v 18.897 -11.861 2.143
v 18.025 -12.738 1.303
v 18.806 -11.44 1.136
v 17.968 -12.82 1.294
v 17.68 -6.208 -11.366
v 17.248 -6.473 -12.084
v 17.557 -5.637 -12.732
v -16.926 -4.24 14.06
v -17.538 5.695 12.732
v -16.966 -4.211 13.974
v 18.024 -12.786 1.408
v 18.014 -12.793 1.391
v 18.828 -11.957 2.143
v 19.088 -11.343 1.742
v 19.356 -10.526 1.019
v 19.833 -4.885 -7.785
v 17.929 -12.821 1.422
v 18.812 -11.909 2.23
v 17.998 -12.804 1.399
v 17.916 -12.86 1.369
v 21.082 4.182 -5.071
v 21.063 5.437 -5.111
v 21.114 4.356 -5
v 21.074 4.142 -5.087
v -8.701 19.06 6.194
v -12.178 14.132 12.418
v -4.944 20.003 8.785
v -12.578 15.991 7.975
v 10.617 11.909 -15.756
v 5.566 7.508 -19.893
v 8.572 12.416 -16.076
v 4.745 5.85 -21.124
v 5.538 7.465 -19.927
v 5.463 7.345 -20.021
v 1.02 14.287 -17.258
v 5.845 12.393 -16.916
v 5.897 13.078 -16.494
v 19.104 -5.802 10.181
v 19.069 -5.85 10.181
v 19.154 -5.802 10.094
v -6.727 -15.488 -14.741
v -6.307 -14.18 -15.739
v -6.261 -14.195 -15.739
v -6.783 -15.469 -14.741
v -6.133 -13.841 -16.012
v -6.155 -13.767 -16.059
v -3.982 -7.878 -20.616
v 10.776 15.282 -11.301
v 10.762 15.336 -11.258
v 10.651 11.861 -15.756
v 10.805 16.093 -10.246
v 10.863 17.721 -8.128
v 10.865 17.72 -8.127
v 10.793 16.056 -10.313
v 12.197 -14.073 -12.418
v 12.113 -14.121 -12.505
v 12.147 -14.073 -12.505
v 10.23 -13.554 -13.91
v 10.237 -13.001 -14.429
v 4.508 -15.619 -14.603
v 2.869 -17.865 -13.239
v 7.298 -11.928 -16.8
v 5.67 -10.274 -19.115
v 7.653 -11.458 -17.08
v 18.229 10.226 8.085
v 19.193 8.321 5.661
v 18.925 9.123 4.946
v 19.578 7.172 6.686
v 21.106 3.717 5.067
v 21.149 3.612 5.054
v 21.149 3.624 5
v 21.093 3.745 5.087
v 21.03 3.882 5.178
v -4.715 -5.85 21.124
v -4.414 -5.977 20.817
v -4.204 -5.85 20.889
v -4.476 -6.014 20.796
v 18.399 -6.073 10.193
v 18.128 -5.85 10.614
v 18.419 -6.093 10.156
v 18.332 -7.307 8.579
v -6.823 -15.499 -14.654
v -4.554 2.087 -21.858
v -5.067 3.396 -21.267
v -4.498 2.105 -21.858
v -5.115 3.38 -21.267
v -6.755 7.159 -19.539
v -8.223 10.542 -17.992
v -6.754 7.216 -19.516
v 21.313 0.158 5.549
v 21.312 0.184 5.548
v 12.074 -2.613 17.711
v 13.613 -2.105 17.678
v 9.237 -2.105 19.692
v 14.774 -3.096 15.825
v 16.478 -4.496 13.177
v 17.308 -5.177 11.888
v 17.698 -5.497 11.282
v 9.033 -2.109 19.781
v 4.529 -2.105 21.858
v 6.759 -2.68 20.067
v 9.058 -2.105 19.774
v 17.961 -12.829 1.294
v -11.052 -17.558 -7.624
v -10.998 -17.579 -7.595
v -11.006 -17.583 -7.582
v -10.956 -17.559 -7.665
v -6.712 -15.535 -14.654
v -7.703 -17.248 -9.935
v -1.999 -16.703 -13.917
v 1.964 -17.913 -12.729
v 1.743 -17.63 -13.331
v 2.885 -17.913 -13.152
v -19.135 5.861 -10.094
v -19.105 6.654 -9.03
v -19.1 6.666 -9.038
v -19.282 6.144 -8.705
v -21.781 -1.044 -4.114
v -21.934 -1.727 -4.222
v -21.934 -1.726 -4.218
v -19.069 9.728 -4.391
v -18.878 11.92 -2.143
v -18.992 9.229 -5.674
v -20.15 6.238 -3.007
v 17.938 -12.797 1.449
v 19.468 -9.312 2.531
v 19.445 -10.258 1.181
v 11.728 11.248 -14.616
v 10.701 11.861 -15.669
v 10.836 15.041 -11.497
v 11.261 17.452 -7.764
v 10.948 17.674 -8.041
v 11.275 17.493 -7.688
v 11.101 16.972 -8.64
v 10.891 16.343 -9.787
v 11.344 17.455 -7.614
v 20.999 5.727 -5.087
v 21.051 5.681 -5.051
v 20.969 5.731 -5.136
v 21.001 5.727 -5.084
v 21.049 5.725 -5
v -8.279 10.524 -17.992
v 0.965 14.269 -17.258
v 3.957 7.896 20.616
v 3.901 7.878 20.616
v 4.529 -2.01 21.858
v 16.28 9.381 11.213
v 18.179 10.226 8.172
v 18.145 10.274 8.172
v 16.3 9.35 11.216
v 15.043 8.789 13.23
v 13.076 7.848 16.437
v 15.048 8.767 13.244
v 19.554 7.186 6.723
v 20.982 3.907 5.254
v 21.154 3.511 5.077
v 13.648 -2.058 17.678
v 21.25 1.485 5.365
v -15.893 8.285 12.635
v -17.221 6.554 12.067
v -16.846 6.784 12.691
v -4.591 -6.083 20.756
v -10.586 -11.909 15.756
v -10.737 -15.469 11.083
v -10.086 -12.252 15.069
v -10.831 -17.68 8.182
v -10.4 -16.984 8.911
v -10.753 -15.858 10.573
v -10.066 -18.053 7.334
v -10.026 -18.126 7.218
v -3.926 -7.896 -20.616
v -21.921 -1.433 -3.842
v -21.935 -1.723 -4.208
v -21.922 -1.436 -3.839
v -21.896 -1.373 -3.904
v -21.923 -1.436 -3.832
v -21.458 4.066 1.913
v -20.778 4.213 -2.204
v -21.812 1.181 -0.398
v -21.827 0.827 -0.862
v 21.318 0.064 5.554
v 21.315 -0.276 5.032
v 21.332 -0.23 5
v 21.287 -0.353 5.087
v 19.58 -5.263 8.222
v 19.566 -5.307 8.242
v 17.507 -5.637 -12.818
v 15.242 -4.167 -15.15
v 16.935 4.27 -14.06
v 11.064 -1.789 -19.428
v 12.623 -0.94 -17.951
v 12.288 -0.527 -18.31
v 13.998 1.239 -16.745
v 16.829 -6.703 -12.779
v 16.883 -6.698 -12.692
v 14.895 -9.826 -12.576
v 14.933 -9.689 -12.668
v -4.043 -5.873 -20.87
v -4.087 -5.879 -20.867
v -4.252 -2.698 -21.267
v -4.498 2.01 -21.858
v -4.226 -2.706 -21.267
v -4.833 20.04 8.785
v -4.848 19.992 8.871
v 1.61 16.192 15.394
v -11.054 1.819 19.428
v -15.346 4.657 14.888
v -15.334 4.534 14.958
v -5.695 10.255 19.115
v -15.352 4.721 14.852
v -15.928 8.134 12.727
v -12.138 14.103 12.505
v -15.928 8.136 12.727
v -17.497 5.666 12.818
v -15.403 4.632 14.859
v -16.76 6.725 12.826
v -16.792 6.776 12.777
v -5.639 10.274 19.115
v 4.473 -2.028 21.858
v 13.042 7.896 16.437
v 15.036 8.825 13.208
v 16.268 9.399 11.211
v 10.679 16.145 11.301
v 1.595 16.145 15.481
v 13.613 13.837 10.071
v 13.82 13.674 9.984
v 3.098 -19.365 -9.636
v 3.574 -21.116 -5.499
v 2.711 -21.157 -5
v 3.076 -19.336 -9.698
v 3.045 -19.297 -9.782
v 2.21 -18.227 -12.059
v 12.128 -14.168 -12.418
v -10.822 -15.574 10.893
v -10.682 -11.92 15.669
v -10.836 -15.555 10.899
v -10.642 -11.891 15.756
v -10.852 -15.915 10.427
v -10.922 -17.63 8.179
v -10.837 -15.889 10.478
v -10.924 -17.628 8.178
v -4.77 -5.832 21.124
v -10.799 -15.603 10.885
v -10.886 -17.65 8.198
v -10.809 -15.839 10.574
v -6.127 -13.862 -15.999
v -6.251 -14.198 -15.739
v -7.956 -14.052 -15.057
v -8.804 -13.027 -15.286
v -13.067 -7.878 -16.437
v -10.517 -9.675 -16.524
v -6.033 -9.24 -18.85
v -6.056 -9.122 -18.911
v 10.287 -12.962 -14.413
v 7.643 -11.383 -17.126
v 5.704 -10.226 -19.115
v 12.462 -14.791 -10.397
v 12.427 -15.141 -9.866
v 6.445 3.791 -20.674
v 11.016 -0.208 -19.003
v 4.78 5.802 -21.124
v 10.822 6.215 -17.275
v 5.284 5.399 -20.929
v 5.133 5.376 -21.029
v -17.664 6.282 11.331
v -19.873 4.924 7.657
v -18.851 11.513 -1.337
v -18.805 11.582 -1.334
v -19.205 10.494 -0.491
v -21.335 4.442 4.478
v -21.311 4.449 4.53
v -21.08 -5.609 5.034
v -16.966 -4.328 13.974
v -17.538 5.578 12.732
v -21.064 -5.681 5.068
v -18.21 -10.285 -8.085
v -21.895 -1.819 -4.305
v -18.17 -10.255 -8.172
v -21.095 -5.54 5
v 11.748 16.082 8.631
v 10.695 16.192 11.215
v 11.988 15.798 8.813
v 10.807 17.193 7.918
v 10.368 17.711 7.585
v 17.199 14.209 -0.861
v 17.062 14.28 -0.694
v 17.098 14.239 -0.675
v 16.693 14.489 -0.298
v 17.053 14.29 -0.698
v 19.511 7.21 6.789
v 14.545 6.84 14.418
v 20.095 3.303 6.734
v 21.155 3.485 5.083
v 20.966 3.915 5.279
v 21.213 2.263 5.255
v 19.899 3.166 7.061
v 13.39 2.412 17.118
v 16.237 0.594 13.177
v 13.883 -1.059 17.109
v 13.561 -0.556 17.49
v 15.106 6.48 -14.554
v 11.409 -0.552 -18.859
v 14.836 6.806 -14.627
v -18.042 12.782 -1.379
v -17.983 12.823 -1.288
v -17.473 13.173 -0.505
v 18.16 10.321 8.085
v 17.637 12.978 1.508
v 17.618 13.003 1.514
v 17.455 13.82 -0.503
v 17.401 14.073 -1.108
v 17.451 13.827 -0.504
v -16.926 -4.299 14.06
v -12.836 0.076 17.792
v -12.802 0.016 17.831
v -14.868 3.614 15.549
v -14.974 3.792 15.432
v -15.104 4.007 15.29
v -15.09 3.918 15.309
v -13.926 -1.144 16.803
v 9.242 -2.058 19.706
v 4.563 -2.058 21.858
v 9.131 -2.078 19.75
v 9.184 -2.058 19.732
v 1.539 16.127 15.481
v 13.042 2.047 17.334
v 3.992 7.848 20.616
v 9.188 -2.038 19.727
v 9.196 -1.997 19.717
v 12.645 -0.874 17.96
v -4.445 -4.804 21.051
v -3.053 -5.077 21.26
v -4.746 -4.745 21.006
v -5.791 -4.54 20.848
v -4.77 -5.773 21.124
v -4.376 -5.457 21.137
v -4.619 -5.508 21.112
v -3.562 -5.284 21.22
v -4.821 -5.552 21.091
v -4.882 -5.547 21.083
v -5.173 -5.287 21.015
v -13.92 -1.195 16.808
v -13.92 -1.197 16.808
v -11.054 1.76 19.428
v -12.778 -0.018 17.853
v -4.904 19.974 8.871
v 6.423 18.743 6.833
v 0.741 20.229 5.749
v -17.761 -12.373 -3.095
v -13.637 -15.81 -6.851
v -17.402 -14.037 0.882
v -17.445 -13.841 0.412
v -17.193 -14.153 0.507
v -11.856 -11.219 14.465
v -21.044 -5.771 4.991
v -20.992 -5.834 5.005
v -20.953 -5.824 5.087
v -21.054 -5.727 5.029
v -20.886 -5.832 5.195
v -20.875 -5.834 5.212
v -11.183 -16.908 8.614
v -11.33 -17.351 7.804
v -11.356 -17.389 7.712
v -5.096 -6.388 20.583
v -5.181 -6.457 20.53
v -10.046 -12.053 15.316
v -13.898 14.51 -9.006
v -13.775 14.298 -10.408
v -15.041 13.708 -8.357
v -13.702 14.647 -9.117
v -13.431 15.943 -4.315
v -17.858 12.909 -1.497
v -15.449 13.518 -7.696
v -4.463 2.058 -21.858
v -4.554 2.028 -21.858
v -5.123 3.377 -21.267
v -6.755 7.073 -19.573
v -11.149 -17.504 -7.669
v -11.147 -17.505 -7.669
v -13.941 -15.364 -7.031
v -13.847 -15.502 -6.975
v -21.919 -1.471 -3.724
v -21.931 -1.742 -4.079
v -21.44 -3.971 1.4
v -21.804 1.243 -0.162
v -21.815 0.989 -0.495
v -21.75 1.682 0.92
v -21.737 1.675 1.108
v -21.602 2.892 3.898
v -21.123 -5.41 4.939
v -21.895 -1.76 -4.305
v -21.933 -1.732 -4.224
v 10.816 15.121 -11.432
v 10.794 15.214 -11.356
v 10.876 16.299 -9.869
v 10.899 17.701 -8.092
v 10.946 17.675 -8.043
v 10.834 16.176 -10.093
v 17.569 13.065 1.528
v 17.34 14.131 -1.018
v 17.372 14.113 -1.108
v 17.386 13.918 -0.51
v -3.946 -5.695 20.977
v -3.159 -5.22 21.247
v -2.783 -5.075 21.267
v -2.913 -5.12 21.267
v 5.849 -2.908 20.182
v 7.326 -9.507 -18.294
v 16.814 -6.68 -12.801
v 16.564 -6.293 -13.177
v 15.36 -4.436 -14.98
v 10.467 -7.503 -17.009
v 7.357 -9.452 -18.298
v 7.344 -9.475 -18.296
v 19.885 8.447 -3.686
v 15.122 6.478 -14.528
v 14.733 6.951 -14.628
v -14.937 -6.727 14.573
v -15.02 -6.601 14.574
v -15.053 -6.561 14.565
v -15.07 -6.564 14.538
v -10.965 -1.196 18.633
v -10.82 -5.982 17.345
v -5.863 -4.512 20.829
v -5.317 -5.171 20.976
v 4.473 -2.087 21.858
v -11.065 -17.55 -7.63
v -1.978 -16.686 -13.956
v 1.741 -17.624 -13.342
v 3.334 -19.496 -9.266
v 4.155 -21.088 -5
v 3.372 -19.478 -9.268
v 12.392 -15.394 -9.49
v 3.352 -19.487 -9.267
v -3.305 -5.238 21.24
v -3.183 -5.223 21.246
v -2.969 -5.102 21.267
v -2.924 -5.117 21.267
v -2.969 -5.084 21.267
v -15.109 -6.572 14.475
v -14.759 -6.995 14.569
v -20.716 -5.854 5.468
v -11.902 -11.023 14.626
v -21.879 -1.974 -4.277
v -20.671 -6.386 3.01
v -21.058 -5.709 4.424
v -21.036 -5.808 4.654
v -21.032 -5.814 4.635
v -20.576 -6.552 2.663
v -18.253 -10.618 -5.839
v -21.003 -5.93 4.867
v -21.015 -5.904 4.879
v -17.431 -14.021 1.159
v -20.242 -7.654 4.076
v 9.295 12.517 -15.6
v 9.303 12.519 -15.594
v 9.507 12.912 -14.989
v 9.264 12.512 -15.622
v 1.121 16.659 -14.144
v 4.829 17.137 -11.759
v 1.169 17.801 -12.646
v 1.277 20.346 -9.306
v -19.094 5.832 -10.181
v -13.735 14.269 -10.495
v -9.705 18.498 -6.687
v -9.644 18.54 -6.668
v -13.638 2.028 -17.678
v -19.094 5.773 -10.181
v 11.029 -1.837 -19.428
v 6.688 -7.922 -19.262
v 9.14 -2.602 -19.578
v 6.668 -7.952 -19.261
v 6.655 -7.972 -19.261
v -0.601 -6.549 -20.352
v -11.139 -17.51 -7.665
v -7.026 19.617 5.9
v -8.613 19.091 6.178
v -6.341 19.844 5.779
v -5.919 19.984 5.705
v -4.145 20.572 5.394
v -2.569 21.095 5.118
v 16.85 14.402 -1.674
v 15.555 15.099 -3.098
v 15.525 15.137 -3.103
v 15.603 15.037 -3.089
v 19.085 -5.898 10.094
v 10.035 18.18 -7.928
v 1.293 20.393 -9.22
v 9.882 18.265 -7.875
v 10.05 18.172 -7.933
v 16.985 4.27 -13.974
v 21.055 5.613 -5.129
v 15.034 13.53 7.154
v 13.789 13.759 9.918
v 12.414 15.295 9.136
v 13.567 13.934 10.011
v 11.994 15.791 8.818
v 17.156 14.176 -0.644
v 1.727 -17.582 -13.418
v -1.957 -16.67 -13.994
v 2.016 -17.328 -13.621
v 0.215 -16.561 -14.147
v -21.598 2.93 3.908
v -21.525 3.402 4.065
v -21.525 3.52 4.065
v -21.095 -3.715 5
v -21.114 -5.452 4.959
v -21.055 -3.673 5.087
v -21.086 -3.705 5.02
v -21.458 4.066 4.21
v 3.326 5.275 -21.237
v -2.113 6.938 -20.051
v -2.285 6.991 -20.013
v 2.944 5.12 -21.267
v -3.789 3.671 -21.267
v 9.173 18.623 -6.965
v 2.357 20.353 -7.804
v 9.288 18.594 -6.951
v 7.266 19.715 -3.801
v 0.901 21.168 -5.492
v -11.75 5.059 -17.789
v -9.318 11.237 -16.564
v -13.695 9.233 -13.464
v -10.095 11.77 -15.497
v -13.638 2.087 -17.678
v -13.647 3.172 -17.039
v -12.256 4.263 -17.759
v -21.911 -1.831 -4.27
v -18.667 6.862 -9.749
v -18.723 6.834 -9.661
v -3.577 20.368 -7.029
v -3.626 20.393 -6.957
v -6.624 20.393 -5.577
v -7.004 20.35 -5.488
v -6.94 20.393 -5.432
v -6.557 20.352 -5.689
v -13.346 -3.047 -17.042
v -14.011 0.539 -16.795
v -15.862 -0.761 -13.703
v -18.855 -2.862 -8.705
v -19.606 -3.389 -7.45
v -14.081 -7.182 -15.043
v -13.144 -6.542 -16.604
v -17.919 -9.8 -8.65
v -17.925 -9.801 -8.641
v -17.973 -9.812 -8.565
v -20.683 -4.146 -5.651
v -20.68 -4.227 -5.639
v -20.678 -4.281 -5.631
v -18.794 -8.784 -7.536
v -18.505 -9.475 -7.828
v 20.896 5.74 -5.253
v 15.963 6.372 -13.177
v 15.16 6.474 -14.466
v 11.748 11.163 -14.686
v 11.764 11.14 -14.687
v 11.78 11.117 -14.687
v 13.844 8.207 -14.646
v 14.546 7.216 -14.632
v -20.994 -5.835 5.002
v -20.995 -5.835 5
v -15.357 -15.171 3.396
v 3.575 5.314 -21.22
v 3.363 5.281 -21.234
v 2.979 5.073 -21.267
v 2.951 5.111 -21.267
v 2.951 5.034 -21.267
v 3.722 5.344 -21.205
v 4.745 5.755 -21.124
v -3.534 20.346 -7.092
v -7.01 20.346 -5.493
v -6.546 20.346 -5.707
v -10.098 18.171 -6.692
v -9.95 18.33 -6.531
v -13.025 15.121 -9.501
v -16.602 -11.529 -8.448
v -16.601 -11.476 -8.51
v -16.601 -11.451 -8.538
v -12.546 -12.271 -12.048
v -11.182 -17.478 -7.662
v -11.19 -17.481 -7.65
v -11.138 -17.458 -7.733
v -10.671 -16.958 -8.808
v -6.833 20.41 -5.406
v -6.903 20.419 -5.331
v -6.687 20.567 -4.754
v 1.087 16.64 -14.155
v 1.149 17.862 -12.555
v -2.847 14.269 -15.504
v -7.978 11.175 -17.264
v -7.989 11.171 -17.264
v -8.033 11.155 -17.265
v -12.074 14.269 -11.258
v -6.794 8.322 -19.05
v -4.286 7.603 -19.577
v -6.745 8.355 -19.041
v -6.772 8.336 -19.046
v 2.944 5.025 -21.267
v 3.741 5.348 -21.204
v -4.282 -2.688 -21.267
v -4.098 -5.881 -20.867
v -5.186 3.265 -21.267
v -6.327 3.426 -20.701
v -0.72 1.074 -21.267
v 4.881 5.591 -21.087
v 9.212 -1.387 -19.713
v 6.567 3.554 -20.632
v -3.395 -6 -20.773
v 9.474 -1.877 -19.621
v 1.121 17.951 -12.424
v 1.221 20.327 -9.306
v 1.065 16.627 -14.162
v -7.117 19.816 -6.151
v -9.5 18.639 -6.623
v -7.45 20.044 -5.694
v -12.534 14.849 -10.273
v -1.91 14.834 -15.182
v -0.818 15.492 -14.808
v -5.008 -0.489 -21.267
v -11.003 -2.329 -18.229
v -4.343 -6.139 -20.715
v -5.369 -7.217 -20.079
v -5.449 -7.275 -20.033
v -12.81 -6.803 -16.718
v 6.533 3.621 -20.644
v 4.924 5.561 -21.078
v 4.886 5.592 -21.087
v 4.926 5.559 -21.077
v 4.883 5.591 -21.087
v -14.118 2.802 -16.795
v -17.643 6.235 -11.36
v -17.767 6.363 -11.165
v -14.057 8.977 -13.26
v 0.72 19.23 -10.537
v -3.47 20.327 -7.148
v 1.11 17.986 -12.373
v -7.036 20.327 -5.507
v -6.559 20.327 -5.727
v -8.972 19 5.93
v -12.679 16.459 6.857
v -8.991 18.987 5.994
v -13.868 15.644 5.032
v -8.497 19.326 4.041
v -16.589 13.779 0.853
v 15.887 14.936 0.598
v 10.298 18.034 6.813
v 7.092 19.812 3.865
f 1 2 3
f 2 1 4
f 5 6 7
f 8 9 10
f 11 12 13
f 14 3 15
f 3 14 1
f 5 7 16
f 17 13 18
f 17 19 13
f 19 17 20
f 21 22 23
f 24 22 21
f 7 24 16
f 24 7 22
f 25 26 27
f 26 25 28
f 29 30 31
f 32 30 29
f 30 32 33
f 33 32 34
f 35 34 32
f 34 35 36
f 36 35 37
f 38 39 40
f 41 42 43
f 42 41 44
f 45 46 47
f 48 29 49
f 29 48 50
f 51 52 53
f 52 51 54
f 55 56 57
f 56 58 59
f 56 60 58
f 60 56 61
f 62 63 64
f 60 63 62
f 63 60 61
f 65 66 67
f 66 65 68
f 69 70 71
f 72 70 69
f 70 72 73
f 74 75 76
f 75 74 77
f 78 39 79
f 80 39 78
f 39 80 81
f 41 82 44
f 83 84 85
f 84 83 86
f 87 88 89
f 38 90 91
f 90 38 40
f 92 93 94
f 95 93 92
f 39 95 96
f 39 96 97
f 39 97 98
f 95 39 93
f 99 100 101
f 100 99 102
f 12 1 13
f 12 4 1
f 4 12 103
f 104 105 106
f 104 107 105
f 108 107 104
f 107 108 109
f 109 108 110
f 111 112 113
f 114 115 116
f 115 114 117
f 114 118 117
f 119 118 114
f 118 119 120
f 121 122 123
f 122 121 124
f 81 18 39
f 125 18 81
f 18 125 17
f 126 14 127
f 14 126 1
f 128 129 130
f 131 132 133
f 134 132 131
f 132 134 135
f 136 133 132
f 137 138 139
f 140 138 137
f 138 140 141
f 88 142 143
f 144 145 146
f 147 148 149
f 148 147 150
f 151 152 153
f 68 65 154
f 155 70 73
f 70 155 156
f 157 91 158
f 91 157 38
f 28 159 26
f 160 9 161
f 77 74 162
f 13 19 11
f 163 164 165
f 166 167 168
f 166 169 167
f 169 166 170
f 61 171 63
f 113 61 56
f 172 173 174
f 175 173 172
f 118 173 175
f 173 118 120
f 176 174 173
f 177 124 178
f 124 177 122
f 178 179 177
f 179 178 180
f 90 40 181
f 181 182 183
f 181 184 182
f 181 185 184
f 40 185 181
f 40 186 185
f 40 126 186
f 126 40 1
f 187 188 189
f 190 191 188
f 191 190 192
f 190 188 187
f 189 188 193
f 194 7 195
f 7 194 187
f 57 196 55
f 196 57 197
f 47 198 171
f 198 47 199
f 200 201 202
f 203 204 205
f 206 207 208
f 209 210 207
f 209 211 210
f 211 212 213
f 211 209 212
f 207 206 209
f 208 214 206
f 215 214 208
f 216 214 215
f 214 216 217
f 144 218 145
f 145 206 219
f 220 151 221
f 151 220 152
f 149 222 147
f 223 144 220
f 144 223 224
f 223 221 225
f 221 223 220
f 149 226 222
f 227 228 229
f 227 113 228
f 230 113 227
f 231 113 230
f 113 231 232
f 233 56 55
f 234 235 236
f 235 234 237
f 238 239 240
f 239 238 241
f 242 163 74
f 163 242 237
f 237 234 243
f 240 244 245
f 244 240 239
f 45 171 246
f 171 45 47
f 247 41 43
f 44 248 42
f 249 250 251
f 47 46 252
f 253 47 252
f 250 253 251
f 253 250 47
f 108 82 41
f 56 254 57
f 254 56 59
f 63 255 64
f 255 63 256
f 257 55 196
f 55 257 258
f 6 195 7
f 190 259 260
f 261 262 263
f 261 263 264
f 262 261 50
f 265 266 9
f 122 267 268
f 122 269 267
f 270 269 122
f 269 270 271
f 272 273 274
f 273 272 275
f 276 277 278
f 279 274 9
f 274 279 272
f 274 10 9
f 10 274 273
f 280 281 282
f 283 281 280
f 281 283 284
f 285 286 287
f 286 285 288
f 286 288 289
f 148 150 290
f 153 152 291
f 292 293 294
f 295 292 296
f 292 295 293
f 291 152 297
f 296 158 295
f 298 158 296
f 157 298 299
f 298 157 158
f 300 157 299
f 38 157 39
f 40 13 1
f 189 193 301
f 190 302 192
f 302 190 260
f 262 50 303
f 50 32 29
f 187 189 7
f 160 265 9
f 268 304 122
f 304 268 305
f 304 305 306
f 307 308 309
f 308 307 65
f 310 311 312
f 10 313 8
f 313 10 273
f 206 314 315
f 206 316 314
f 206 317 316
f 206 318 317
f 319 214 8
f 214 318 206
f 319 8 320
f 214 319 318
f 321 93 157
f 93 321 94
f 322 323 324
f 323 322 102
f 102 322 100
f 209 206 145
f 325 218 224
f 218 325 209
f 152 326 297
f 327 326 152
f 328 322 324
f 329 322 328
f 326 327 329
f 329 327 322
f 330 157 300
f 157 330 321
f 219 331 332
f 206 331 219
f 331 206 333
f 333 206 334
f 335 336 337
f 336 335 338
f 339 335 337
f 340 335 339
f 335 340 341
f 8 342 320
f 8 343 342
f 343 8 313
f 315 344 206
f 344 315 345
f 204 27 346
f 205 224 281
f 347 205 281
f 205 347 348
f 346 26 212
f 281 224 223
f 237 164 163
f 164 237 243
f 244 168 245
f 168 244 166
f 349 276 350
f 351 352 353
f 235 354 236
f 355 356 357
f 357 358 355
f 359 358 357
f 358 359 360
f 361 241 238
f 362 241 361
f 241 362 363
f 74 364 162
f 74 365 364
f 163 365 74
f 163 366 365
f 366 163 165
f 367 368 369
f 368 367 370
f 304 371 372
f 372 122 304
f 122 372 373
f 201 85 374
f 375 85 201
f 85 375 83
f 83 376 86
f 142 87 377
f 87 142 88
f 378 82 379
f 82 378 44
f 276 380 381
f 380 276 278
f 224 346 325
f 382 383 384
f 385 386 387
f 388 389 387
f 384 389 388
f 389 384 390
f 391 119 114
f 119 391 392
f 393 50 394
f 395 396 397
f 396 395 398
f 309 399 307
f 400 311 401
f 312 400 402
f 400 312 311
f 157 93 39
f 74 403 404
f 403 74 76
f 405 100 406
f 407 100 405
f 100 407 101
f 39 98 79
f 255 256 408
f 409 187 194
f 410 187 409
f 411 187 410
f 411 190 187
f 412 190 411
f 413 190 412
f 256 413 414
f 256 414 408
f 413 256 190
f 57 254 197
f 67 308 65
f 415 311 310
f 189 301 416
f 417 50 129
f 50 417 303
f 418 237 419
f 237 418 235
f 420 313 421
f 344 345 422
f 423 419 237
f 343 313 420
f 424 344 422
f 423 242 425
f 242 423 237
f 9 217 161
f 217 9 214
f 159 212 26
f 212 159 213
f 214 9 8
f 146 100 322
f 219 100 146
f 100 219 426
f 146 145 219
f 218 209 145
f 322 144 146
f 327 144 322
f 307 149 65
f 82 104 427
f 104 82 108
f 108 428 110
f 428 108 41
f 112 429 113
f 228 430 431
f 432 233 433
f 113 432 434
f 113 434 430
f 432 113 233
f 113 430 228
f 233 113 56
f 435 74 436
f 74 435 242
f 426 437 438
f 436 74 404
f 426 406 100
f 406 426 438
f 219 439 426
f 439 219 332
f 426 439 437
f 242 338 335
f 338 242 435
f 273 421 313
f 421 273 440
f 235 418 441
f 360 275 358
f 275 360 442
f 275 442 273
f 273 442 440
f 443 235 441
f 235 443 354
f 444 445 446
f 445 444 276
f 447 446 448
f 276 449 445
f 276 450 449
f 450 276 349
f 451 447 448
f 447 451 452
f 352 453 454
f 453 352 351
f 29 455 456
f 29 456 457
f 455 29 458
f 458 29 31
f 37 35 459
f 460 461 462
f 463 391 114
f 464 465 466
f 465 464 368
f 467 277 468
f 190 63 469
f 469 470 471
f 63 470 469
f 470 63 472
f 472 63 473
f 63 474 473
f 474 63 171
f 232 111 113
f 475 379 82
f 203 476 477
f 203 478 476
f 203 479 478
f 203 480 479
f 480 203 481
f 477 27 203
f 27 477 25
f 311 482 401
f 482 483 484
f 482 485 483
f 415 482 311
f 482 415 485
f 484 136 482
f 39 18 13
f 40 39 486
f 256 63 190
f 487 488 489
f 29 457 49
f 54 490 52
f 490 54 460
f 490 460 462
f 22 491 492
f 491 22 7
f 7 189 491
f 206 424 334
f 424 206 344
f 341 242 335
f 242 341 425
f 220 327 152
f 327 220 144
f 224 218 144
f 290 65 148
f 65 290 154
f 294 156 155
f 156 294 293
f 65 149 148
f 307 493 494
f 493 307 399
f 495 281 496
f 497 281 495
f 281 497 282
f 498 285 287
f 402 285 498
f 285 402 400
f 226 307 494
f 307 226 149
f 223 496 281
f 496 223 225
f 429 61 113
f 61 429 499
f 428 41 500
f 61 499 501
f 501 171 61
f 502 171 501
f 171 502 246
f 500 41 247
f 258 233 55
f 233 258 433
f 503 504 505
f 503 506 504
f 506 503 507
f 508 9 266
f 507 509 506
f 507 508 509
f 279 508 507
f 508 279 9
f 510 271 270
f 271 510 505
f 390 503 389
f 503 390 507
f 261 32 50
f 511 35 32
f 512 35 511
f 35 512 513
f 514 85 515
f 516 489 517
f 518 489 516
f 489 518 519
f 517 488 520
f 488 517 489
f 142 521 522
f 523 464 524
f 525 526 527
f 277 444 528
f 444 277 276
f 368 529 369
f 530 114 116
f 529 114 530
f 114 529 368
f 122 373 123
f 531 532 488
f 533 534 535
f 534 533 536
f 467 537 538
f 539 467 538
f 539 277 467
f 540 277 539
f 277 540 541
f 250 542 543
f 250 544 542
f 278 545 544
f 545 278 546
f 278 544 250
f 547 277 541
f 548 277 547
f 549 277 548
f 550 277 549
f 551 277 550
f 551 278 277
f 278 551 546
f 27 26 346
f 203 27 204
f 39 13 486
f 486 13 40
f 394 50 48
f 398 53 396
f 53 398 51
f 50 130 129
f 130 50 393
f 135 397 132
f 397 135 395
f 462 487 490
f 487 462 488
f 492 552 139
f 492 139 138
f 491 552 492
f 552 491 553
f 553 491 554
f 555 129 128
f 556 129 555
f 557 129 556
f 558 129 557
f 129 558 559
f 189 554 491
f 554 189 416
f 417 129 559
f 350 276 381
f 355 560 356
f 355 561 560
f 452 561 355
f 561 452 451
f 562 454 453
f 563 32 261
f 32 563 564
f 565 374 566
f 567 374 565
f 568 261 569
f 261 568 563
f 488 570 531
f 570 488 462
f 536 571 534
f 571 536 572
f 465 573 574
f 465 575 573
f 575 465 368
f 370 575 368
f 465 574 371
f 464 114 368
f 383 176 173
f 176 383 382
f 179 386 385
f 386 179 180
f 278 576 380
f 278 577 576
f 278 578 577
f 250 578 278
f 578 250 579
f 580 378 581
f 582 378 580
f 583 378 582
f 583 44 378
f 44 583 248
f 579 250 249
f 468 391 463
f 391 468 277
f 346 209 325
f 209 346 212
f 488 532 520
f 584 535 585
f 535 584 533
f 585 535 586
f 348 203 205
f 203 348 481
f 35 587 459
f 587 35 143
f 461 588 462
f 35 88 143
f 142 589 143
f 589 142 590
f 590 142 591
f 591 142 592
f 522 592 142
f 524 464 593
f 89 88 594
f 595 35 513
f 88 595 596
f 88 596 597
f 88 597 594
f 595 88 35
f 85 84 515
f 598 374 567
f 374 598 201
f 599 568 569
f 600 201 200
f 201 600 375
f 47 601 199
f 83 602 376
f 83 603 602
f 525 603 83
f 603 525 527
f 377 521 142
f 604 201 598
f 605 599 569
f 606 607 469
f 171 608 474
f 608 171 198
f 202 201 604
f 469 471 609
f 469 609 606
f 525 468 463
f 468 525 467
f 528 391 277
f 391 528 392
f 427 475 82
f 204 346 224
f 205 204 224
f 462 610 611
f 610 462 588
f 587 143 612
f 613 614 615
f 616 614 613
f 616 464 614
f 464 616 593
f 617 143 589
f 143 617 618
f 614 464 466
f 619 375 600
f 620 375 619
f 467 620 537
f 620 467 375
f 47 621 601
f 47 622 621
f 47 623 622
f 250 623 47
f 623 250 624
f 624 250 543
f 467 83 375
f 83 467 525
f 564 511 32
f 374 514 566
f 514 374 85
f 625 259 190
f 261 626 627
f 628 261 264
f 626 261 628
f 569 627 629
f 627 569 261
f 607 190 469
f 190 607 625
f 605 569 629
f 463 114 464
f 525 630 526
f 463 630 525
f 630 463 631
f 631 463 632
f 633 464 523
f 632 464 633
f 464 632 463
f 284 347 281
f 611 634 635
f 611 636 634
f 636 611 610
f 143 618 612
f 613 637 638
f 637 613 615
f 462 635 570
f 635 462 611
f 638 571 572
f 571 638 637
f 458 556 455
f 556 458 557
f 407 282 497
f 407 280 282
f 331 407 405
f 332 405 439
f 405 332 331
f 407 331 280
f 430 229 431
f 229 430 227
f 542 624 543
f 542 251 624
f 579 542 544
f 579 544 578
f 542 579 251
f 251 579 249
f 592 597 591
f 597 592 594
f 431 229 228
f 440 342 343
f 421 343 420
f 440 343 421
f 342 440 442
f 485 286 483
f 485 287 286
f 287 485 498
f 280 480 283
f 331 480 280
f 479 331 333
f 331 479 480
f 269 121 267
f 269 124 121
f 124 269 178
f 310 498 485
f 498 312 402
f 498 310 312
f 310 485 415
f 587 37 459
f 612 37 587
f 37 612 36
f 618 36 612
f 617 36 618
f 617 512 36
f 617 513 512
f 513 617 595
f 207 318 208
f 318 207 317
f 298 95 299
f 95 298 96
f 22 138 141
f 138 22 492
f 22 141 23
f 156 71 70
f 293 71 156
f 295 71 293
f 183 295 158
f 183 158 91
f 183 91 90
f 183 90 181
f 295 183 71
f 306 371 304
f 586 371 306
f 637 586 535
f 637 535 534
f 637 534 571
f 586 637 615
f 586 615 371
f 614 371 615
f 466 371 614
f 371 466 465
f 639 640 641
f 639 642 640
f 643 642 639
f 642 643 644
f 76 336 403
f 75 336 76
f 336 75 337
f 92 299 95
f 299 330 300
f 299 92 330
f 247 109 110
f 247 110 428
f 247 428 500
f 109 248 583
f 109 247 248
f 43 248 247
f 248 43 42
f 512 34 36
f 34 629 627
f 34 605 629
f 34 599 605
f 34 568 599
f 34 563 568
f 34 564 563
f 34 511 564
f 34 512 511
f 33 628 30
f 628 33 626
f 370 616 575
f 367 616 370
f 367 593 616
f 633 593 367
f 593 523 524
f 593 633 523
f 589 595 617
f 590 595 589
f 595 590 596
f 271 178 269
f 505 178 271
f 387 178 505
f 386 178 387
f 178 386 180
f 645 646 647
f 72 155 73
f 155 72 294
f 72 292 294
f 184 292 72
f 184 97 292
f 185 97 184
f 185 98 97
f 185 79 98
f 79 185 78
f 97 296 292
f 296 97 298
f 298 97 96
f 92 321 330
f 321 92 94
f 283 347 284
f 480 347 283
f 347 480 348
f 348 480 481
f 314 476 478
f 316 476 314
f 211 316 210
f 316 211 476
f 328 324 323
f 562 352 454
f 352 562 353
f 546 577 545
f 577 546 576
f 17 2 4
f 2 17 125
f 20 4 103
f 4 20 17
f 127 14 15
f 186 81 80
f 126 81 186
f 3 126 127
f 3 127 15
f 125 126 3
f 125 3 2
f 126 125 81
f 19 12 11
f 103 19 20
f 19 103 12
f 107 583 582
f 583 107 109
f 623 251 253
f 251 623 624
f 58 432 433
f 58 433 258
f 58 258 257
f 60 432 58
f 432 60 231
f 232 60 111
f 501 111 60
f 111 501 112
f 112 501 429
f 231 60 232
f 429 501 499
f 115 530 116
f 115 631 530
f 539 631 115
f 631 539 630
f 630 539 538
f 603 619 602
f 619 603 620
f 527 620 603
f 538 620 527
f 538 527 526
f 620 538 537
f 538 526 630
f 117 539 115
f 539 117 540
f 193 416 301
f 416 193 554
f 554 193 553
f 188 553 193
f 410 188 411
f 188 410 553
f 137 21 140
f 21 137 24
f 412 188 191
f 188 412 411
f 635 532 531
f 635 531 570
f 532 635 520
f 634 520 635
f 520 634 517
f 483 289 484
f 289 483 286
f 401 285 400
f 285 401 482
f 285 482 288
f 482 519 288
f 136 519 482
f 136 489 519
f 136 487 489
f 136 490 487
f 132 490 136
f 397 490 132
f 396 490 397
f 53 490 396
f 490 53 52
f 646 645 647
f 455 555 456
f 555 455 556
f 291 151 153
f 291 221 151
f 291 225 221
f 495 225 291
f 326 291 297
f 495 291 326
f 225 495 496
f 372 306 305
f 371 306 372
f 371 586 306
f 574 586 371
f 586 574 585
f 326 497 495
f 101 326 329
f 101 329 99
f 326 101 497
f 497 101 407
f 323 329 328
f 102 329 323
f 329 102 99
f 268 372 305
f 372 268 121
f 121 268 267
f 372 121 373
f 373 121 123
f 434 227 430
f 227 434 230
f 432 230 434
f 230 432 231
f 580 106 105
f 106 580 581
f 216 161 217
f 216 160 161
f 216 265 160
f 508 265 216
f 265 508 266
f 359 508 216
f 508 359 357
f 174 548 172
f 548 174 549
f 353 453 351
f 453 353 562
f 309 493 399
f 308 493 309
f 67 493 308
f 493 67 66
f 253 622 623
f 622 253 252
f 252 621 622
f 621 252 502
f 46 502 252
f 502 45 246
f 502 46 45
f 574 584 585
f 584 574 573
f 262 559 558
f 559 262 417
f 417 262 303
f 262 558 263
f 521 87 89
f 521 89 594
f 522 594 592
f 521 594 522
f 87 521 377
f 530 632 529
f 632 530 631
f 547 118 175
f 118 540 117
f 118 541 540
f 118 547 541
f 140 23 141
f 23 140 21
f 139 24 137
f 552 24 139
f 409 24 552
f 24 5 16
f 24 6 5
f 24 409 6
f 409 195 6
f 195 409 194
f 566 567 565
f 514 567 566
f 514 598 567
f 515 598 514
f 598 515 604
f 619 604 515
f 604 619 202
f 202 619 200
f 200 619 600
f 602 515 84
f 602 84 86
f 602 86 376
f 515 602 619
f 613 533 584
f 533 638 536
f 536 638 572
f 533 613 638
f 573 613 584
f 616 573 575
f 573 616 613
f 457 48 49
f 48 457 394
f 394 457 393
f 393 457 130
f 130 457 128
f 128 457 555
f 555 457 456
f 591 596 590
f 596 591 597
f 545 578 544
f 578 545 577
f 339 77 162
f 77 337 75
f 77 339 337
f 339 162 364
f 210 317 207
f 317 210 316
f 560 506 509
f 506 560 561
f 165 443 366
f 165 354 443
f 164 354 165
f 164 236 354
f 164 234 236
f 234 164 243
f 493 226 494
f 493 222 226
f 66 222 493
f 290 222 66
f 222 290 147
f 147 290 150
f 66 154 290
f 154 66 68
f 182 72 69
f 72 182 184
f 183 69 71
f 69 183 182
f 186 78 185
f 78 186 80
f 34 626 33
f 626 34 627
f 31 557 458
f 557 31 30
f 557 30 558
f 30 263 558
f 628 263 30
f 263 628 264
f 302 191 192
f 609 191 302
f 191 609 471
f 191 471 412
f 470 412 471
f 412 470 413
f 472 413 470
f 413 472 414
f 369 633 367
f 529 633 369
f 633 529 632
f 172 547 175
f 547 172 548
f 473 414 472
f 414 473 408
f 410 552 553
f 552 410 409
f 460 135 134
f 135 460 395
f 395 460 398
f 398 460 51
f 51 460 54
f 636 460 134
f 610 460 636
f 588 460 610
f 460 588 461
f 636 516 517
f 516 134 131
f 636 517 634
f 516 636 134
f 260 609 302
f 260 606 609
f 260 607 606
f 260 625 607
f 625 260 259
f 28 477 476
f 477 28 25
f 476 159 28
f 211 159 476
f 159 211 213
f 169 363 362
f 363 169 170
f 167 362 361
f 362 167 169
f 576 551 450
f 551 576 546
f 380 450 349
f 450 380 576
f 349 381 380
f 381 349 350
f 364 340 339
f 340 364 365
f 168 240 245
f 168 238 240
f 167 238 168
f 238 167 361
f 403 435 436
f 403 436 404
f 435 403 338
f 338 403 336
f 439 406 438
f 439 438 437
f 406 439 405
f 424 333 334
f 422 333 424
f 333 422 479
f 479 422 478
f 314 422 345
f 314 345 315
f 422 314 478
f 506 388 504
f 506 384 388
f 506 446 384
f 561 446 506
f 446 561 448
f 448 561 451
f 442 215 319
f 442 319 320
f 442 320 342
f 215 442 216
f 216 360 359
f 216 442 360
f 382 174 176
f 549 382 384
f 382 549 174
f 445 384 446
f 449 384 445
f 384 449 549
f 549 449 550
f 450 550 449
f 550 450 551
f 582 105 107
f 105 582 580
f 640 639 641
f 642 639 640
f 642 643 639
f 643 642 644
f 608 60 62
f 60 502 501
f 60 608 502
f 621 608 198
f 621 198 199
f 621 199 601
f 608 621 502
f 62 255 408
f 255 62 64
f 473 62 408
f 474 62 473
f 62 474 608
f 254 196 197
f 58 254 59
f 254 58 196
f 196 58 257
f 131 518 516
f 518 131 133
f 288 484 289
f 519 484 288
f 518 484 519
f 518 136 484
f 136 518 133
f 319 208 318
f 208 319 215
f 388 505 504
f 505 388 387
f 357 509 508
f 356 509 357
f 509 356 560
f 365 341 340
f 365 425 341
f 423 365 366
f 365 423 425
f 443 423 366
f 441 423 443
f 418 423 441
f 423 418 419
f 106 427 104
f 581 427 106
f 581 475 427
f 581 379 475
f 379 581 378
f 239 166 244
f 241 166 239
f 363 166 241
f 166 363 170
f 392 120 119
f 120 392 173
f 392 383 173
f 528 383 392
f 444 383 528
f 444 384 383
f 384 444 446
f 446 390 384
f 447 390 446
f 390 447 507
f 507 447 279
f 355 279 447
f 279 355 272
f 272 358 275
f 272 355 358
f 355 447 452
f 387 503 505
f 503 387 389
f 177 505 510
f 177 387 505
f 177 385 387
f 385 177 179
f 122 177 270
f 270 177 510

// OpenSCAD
// Auto-generated OpenSCAD file

    inner_points = 10*[[-1.652954838618672, 0.7331031267239583, 1.309016994374885], [1.8705714695316353, -1.2202296084263586, 9.520162436160717e-14], [-2.1377569026756937, 0.40075020963339975, 0.49999999999995376], [1.3857694054746135, -1.5525825255169172, -0.8090169943748362], [-1.3826041813849252, 1.5558488481550894, 0.8090169943748362], [2.140922126765382, -0.3974838869952276, -0.49999999999995376], [-1.867406245441947, 1.2234959310645308, -9.520162436160717e-14], [1.6561200627083603, -0.7298368040857861, -1.309016994374885], [-0.7445241014447653, -1.3442341281397892, 1.618033988749972], [0.08726762778757838, -1.8053534363108568, 1.3090169943750618], [-1.2293261655017869, -1.6765870452303477, 0.8090169943750405], [-0.3975344362694432, -2.1377063534014153, 0.5000000000001303], [0.4006996603591313, 2.1409726760395875, -0.5000000000001303], [1.232491389591475, 1.67985336786852, -0.8090169943750405], [-0.08410240369789032, 1.808619758949029, -1.3090169943750618], [0.7476893255344533, 1.3475004507779613, -1.618033988749972], [1.3091303975330184, 0.0636354211759657, 1.8090169943749566], [-2.199388481084053, -0.10273410018217301, -0.36180339887500484], [-0.7445241014447332, -1.3442341281399923, -1.6180339887498179], [1.579481054766765, 0.8863811426070967, 1.3090169943749077], [-1.929037823850306, 0.7200116212489581, -0.8618033988750537], [-0.47417344421098645, -0.5214884067088612, -2.118033988749867], [2.140922126765372, -0.3974838869951649, 0.5000000000000463], [-1.3675967518516992, -0.5638534083533033, -1.670820393249915], [0.8716938452479853, -1.2675951201984228, -1.6180339887498065], [-1.5763158306771028, -0.8831148199687601, 1.3090169943749874], [0.6013431880142225, -2.0903408416294527, 0.5000000000001372], [-0.5981779639245345, 2.093607164267625, -0.5000000000001372], [1.579481054766791, 0.8863811426069322, -1.3090169943749874], [0.5247041800726373, -0.4741228949366325, 2.11803398874993], [-1.2293261655017709, -1.6765870452304492, -0.8090169943748543], [1.232491389591459, 1.6798533678686214, 0.8090169943748543], [-0.5215389559829493, 0.4773892175748047, -2.11803398874993], [-1.305965173443366, -0.060369098537566515, 1.8090169943749381], [1.3857694054745975, -1.5525825255168155, 0.8090169943750587], [-2.090391390903731, -0.5981274146502662, 0.5000000000000169], [0.6013431880142324, -2.0903408416295153, -0.49999999999986267], [-0.5981779639245444, 2.0936071642676874, 0.49999999999986267], [2.0935566149934193, 0.6013937372884384, -0.5000000000000169], [-1.3826041813849093, 1.5558488481549877, -0.8090169943750587], [1.3091303975330542, 0.06363542117573866, -1.8090169943749381], [-0.4741734442110284, -0.5214884067085954, 2.1180339887499233], [0.8716938452479531, -1.26759512019822, 1.6180339887499833], [-1.743401725728415, -1.3915996399118535, 7.027711745877241e-14], [-0.39753443626943324, -2.137706353401478, -0.49999999999986966], [0.40069966035912136, 2.14097267603965, 0.49999999999986966], [1.7465669498181031, 1.3948659625500257, -7.027711745877241e-14], [-0.8685286211582651, 1.2708614428363922, -1.6180339887499833], [0.47733866830071653, 0.5247547293467676, -2.1180339887499233], [1.6561200627083341, -0.7298368040856218, 1.3090169943750098], [-1.8523988159087368, -0.8962063254437607, -0.8618033988749515], [0.08726762778760436, -1.8053534363110213, -1.3090169943748333], [2.093556614993409, 0.601393737288501, 0.4999999999999831], [-1.4149622636236618, 0.43502421593036245, -1.6708203932499783], [0.5247041800726793, -0.47412289493689824, -2.11803398874986]];

    outer_points = 10*[[0.4513288900262728, -0.2057852874430356, 2.1771593019343873], [-1.302649108448602, -0.7848281063879728, -1.6349978963843712], [0.3941935542206573, 0.7848281063879728, 2.052979362471562], [-1.3597844442542175, 0.2057852874430356, -1.7591778358471963], [1.3597844442542175, -0.2057852874430356, 1.7591778358471963], [-0.3941935542206573, -0.7848281063879728, -2.052979362471562], [1.302649108448602, 0.7848281063879728, 1.6349978963843712], [-0.4513288900262728, 0.2057852874430356, -2.1771593019343873], [-1.688543053881056, -0.4269599633384501, 1.3973530414307818], [-2.102601092560149, -0.5636534304925583, 0.4974248017124077], [-1.7456783896866714, 0.5636534304925583, 1.273173101967957], [-2.1597364283657643, 0.4269599633384501, 0.373244862249583], [2.1597364283657643, -0.4269599633384501, -0.373244862249583], [1.7456783896866714, -0.5636534304925583, -1.273173101967957], [2.102601092560149, 0.5636534304925583, -0.4974248017124077], [1.688543053881056, 0.4269599633384501, -1.3973530414307818], [-0.5402422132585865, -2.1664995714220154, 0.022043945687575728], [0.15791777208586583, 1.609728484671791, 1.5394493042628863], [-0.7822713796484513, 2.029806104267907, -0.5039907193187587], [0.3682133409693583, -2.1664995714220154, -0.3959375203996154], [1.0663733263138107, 1.609728484671791, 1.121467838175695], [0.1261841745794935, 2.029806104267907, -0.9219721854059499], [-0.6742469030791683, -1.544010572482048, -1.4654318282511805], [0.02391308226528406, 2.232217483611758, 0.051973530324130296], [-0.8238291541769085, 1.0494489622784173, -1.79053913048576], [-1.1014025269441718, 0.17893407152476137, 1.9341569349947676], [-2.185420545521156, -0.17893407152476137, -0.4218857840237987], [2.185420545521156, 0.17893407152476137, 0.4218857840237987], [1.1014025269441718, -0.17893407152476137, -1.9341569349947676], [-1.0858249656670136, -1.792036464295737, 0.7717884632905911], [-1.292542552570369, 1.792036464295737, 0.32250122159318684], [1.292542552570369, -1.792036464295737, -0.32250122159318684], [1.0858249656670136, 1.792036464295737, -0.7717884632905911], [-0.47300032157473804, -0.5802483945693141, 2.103723003127959], [-1.81292028137052, -1.0225977463601432, -0.8085059554724263], [-0.5654472368668626, 1.0225977463601432, 1.9027956403562043], [-1.9053671966626446, 0.5802483945693141, -1.0094333182441808], [1.9053671966626446, -0.5802483945693141, 1.0094333182441808], [0.5654472368668626, -1.0225977463601432, -1.9027956403562043], [1.81292028137052, 1.0225977463601432, 0.8085059554724263], [0.47300032157473804, 0.5802483945693141, -2.103723003127959], [-1.0601408485116224, -1.1861424294325253, 1.566919109563973], [-1.7301008284095134, -1.40731710532794, 0.11080463026378029], [-1.2097230996093626, 1.40731710532794, 1.2418118073293933], [-1.8796830795072537, 1.1861424294325253, -0.21430267197079933], [1.8796830795072537, -1.1861424294325253, 0.21430267197079933], [1.2097230996093626, -1.40731710532794, -1.2418118073293933], [1.7301008284095134, 1.40731710532794, -0.11080463026378029], [1.0601408485116224, 1.1861424294325253, -1.566919109563973], [-1.1845180760010863, -1.7817802124542186, -0.638939887339235], [-0.4863580906566339, 1.994447843639588, 0.8784654712360758], [-1.3694119065853356, 1.4239120694046958, -1.0407946128827448], [0.28539388800835175, -1.7817802124542186, -1.3152481061358219], [0.9835538733528042, 1.994447843639588, 0.202157252439489], [0.1005000574241024, 1.4239120694046958, -1.7171028316793315]];

    // Convex hull for inner set (I)
    module inner_hull() {
        hull() {
            for (p = inner_points) {
                translate(p) sphere(r=0.1);
            }
        }
    }

    // Convex hull for outer set (O) minus inner hull (O \ I)
    module outer_minus_inner() {
        difference() {
            hull() {
                for (p = outer_points) {
                    translate(p) sphere(r=0.1);
                }
            }
            inner_hull(); // Subtract inner hull
        }
    }

    // Convex hull for outer set (O) minus all translated inner hulls
    module outer_minus_AllTranslationInner() {
        difference() {
            hull() {
                for (p = outer_points) {
                    translate(p) sphere(r=0.1);
                }
            }
            hull() {
                translate([0,0,50]) inner_hull();
                translate([0,0,-50]) inner_hull();
            }; // Subtract translated inner hulls
        }
    }

    // Difference between outer_minus_inner and outer_minus_AllTranslationInner
    module outer_minus_inner_diff() {
        difference() {
            // Outer minus inner
            difference() {
                hull() {
                    for (p = outer_points) {
                        translate(p) sphere(r=0.1);
                    }
                }
                inner_hull();
            }

            // Subtract Outer minus AllTranslationInner
            difference() {
                hull() {
                    for (p = outer_points) {
                        translate(p) sphere(r=0.1);
                    }
                }
                hull() {
                    translate([0,0,50]) inner_hull();
                    translate([0,0,-50]) inner_hull();
                };
            }
        }
    }

    // Rendering all with colors applied
    color([1, 1, 0, 1]) outer_minus_inner_diff(); // Opaque yellow
    
